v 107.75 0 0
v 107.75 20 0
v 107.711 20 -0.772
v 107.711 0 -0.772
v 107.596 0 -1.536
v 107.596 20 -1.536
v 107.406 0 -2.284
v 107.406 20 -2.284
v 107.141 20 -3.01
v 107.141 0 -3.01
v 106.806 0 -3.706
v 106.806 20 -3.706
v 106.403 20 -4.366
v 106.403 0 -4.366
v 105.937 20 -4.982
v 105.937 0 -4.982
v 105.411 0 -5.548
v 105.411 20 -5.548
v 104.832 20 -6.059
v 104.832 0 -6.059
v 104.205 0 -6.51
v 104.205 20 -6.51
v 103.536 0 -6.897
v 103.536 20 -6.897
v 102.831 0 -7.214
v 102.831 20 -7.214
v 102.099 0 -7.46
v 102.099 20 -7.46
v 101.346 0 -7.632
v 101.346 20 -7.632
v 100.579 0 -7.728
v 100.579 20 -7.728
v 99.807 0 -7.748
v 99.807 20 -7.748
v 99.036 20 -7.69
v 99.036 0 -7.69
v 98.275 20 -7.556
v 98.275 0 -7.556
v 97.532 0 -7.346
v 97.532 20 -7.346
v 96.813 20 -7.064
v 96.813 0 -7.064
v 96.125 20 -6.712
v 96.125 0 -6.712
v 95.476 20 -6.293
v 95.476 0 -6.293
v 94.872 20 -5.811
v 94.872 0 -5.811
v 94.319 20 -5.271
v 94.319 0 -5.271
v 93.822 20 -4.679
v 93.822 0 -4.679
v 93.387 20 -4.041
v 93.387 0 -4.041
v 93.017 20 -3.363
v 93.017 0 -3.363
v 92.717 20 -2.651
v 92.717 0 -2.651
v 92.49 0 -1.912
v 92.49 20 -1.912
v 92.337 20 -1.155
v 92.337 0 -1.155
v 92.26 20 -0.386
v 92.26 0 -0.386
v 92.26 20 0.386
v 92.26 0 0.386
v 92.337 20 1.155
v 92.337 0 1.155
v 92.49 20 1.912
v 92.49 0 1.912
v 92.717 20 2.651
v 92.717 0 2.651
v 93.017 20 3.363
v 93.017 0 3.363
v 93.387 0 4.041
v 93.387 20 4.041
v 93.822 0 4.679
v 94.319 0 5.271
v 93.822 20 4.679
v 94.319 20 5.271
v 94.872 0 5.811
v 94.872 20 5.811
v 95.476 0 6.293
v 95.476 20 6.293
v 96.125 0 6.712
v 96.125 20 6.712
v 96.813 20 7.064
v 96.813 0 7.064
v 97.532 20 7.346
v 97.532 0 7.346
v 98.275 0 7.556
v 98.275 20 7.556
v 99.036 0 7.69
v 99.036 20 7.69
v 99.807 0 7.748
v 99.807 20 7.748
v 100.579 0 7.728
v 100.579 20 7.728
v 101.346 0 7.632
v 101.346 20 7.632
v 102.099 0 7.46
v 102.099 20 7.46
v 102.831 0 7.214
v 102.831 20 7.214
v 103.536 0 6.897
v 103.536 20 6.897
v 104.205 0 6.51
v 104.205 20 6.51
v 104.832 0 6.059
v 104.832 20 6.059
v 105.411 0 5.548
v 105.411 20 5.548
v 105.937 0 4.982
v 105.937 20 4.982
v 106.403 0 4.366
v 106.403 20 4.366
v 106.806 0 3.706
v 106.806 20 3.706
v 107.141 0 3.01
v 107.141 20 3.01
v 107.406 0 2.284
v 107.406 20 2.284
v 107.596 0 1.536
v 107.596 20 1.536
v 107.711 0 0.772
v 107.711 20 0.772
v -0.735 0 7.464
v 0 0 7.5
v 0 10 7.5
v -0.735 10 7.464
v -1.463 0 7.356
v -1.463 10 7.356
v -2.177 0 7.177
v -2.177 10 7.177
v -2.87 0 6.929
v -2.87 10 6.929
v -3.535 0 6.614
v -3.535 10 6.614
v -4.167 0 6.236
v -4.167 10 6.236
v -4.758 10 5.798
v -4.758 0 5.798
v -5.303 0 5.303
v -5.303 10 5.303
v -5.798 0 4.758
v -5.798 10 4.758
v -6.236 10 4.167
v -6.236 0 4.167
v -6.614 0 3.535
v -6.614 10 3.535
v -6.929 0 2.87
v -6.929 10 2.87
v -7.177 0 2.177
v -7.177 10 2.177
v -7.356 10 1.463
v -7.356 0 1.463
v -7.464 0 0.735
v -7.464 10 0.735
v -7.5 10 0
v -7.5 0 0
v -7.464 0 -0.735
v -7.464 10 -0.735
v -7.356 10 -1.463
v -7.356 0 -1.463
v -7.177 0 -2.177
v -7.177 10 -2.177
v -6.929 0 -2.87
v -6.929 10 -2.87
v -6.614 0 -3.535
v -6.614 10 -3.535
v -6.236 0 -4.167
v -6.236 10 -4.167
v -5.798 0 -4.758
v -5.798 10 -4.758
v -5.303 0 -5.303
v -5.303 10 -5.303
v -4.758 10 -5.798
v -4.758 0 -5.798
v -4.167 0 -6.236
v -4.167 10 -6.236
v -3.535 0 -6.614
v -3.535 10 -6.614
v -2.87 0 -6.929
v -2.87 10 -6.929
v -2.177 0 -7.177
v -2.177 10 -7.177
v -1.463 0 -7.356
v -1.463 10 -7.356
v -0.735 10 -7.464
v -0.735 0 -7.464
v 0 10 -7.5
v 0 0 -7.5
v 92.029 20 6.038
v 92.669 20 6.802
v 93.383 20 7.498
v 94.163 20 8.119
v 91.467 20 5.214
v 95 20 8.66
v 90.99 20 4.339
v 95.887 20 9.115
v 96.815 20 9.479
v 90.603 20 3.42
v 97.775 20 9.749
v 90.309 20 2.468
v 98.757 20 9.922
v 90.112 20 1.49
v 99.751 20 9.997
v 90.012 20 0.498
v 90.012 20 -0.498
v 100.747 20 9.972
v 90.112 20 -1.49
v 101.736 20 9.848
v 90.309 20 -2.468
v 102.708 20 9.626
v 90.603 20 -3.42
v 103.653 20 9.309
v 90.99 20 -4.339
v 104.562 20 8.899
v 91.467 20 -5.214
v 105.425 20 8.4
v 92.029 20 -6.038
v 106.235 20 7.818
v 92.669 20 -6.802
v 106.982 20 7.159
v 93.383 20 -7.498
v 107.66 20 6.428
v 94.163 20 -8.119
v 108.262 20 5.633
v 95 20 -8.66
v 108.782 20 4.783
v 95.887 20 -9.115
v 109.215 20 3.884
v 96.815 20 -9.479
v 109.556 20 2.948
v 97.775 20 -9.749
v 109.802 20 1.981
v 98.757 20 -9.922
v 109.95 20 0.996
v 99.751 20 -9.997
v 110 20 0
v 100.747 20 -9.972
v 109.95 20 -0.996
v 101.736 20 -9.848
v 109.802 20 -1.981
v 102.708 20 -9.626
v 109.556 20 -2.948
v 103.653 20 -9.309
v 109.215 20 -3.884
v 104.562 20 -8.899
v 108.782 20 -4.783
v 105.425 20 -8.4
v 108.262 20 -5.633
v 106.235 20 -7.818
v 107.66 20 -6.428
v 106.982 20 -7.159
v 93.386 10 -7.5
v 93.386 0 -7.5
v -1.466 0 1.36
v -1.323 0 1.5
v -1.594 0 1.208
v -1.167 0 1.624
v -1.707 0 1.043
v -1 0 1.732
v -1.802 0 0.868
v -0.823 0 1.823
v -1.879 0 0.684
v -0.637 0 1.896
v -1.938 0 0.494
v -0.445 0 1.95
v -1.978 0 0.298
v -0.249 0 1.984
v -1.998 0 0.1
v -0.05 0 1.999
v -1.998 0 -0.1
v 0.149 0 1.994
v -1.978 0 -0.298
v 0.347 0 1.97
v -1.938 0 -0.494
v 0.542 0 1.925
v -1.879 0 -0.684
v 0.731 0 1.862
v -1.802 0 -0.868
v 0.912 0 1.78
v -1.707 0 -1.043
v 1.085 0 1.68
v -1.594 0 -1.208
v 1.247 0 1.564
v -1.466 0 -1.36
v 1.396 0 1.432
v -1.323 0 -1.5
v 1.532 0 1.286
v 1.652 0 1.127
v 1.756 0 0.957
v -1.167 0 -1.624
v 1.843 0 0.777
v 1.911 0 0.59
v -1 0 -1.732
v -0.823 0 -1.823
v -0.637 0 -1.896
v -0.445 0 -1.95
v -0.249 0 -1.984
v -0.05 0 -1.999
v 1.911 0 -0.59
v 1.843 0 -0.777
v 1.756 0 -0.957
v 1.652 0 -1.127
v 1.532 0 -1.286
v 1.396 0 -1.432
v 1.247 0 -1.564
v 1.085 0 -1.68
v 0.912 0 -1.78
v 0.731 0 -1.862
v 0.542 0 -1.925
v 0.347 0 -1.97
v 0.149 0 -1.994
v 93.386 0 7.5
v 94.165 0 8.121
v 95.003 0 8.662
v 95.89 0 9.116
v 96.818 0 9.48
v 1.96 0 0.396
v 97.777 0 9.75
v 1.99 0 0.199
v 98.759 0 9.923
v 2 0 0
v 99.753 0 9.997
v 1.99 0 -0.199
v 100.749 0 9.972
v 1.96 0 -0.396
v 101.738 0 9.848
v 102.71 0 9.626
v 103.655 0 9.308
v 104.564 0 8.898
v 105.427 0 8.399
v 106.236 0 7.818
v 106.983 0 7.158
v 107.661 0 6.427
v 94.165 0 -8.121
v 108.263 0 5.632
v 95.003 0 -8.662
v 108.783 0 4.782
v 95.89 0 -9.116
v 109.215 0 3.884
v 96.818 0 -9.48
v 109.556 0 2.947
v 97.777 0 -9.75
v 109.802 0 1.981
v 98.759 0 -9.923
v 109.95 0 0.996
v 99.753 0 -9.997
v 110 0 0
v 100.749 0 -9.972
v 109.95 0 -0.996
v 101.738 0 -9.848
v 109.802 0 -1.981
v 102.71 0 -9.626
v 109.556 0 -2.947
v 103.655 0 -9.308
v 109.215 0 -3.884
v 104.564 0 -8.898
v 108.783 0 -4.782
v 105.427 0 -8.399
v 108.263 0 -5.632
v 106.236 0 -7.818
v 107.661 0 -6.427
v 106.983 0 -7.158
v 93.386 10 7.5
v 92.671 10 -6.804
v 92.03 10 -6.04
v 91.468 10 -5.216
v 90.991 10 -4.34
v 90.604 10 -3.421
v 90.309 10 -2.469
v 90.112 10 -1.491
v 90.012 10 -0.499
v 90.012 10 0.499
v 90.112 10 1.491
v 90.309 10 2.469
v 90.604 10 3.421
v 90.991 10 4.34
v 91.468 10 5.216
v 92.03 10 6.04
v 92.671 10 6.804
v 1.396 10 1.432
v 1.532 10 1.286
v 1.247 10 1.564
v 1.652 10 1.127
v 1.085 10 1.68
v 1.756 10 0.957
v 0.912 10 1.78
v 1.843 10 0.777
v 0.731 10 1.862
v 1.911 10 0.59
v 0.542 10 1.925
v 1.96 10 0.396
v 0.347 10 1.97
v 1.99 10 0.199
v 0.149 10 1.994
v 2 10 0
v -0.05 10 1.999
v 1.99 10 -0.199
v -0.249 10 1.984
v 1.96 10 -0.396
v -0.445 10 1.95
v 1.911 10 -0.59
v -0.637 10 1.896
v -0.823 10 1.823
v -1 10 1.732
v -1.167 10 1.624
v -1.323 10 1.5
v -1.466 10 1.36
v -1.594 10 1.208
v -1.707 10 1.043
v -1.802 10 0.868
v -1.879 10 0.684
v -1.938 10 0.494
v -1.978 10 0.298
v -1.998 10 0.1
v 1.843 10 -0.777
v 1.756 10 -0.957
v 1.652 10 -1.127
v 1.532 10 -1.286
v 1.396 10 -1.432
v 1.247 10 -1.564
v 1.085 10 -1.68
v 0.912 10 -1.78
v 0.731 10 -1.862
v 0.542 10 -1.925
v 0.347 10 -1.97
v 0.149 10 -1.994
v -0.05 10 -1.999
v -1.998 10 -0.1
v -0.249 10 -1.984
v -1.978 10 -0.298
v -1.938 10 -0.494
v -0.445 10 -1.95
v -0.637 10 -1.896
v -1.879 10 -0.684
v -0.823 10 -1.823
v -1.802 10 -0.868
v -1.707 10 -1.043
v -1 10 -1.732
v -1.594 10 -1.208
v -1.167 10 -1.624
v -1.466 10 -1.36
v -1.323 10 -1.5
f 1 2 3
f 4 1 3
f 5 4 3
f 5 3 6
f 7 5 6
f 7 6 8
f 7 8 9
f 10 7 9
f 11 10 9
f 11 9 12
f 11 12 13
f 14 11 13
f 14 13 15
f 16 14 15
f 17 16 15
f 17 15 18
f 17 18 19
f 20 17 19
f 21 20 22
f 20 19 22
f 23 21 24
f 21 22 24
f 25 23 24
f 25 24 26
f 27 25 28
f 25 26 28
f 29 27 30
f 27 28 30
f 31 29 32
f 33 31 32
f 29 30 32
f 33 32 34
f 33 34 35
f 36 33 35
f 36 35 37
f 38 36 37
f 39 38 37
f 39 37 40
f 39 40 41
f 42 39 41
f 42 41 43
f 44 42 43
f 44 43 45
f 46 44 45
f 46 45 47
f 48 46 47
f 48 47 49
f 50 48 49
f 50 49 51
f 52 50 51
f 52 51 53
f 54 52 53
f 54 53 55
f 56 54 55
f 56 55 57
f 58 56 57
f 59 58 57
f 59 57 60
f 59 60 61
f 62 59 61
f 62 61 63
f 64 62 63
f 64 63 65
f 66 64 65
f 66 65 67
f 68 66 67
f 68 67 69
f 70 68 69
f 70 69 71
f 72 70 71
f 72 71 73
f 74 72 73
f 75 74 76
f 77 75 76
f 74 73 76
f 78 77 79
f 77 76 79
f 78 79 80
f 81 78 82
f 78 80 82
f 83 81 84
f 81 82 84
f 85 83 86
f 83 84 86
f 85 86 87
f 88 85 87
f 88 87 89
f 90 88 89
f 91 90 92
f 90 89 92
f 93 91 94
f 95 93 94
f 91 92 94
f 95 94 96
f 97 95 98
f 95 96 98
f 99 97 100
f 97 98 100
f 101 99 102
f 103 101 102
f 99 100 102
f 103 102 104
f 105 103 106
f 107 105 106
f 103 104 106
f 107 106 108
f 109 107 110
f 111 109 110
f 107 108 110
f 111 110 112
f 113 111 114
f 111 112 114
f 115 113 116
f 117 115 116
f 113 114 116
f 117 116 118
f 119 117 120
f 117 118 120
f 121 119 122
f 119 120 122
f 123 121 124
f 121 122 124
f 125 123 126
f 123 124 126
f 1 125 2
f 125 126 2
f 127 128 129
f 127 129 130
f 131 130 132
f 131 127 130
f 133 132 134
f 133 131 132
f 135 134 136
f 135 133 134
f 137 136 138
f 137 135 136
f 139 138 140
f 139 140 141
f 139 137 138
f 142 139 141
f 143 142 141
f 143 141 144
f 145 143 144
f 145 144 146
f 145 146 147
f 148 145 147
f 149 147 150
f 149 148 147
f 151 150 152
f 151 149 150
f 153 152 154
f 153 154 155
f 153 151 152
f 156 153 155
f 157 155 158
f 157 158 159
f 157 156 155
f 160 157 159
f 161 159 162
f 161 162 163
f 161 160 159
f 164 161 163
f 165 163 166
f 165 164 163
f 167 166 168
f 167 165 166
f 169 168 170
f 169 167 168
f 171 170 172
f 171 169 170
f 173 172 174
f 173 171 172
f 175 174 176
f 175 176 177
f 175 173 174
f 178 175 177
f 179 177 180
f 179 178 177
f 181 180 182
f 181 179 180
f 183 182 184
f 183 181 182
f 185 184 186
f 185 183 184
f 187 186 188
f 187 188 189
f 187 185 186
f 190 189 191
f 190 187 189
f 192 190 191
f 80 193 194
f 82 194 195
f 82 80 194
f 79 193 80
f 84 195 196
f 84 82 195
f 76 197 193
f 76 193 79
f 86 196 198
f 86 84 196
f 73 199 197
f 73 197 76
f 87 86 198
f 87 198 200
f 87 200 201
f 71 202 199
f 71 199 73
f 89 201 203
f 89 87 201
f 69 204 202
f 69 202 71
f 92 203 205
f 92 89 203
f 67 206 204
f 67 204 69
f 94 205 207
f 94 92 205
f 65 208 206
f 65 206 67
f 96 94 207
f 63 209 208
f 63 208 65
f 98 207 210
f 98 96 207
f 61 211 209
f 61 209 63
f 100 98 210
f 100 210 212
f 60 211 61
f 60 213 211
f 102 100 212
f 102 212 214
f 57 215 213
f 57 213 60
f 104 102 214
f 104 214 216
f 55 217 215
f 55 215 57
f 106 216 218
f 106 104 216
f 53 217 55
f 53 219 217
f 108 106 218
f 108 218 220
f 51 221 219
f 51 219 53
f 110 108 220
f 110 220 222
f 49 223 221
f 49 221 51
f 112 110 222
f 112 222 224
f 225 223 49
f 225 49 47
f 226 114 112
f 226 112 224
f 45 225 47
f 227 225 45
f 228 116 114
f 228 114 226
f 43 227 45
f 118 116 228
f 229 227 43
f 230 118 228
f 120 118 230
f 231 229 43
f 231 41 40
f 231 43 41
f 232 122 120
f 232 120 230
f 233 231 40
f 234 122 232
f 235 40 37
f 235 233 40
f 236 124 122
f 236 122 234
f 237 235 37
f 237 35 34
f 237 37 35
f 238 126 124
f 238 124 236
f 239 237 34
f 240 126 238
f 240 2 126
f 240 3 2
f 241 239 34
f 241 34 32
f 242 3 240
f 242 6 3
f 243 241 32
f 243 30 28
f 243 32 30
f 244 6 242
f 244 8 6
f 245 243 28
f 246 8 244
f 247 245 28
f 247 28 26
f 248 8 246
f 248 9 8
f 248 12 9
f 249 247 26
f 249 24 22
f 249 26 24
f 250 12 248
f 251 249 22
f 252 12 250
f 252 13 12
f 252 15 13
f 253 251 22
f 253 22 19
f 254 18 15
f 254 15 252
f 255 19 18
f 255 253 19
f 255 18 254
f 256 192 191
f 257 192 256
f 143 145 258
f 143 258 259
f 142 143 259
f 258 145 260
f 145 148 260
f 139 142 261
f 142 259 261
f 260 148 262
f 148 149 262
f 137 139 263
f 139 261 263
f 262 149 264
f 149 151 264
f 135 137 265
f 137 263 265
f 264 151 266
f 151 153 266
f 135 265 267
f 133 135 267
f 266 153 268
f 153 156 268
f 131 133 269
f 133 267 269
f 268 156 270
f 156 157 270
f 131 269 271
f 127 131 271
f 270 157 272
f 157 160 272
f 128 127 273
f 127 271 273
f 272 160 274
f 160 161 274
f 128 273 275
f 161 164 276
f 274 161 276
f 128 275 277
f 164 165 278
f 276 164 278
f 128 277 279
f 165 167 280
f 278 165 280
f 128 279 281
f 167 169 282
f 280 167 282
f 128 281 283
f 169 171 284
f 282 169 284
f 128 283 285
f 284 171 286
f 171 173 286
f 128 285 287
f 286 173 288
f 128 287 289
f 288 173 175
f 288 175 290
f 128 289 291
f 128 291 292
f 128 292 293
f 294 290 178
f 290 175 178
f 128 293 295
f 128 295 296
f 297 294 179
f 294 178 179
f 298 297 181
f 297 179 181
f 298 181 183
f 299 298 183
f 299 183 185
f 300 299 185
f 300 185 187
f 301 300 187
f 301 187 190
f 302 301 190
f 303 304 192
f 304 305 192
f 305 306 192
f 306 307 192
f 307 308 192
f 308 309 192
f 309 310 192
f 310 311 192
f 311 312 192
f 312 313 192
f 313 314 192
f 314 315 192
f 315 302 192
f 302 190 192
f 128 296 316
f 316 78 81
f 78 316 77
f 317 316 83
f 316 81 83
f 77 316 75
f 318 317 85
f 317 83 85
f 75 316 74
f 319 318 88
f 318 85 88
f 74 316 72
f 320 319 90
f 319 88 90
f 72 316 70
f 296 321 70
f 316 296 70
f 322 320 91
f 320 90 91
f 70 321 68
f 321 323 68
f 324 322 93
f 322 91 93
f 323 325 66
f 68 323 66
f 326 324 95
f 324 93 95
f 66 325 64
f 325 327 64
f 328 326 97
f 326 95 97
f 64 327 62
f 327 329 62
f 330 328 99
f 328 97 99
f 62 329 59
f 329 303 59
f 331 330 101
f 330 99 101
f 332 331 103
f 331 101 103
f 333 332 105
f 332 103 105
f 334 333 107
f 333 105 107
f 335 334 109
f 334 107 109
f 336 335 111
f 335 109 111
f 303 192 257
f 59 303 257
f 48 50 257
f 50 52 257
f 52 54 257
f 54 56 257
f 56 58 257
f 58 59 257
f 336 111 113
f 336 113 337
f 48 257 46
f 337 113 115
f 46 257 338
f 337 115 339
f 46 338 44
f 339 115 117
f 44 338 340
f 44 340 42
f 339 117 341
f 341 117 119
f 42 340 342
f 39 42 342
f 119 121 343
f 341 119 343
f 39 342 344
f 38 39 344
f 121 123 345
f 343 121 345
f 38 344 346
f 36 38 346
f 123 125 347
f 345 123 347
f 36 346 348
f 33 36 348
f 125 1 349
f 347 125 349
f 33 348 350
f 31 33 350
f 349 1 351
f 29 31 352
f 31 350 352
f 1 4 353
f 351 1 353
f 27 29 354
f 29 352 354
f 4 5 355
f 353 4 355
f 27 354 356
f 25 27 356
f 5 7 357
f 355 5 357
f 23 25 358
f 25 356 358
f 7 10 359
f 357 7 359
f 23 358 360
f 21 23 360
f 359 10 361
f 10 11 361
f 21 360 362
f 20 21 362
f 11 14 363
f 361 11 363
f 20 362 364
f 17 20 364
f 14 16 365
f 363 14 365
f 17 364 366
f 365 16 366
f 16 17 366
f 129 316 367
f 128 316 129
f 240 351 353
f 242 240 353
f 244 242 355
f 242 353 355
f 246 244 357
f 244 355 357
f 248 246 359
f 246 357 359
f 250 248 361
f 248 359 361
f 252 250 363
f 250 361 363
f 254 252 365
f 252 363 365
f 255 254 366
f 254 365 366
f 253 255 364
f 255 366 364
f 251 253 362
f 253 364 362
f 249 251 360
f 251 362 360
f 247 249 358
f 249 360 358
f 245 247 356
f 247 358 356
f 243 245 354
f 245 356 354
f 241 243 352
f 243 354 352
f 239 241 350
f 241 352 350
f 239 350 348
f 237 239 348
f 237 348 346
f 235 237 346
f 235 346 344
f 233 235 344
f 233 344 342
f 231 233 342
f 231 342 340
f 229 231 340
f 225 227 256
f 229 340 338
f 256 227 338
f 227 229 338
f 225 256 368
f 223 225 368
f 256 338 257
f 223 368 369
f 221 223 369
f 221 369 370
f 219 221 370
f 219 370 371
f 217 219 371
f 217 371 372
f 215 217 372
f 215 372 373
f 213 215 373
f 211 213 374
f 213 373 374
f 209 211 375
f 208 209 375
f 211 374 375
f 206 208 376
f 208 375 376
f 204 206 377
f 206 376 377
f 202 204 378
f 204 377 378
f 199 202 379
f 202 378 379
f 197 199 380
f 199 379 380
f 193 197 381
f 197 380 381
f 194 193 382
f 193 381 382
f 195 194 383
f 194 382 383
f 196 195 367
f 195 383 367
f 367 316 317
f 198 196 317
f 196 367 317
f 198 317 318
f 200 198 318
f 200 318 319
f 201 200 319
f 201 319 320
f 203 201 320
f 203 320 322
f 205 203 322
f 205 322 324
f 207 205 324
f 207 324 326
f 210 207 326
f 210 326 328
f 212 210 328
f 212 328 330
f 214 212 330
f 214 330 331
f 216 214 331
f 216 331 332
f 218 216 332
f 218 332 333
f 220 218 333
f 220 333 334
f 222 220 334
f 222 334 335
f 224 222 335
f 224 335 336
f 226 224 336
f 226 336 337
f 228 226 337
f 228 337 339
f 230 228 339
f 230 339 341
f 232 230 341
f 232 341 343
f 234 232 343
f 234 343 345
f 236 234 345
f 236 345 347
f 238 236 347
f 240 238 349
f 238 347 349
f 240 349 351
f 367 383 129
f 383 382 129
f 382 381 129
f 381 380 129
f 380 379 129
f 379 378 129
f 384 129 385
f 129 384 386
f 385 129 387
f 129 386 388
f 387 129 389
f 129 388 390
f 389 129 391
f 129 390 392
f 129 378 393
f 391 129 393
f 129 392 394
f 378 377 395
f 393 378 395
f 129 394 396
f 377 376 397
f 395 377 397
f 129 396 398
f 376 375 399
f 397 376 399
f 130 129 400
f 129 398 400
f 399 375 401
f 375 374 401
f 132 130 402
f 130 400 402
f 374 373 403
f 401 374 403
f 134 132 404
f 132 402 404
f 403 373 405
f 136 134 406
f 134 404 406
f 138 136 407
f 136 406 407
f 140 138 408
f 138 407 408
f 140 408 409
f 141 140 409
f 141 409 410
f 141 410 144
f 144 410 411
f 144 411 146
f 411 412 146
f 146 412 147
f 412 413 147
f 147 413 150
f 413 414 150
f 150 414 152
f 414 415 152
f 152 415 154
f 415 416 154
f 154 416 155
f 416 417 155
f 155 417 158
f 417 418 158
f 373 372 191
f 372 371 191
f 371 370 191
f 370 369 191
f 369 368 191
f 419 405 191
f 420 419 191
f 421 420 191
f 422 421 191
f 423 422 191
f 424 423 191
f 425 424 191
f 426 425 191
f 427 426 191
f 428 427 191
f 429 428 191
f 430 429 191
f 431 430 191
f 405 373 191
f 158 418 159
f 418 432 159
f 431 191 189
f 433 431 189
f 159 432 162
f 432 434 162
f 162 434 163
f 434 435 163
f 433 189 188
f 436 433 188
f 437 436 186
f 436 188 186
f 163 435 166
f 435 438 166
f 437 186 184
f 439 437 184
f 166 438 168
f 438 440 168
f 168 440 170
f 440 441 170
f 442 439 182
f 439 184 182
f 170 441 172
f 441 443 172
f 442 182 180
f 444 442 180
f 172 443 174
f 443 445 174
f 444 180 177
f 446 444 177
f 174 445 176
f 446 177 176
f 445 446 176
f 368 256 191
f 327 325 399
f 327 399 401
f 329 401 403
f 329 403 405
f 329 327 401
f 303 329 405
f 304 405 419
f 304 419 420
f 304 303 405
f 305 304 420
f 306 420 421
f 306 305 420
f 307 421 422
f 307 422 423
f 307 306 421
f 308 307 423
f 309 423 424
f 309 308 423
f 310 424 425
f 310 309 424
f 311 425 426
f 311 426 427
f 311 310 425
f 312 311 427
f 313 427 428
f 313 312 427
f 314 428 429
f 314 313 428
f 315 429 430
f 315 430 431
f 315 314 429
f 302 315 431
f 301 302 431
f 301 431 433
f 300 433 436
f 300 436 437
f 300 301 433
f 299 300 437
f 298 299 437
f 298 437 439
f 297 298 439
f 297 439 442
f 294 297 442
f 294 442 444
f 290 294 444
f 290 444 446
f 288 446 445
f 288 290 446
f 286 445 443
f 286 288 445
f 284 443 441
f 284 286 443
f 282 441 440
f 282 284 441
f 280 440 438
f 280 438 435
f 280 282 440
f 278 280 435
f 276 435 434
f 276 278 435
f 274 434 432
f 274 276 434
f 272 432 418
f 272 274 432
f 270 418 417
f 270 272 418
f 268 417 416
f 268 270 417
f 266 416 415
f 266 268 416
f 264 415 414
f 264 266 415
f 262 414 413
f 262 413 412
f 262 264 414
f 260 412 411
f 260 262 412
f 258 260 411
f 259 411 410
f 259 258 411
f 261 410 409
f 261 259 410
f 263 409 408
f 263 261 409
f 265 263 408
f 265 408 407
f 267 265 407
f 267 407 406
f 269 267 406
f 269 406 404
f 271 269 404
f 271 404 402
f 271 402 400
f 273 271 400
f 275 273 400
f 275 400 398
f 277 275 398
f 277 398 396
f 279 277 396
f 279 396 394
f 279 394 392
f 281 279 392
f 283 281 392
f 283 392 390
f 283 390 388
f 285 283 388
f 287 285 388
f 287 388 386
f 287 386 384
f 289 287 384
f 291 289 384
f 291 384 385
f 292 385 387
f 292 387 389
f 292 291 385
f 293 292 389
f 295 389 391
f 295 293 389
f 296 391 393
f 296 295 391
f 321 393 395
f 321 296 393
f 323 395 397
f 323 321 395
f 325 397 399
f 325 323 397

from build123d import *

# Parameters (mm, degrees)
SKETCH2_R           = 2
SKETCH2_R_2         = 2.5
BOSS_EXTRUDE1_DEPTH = 10
SKETCH3_R           = 10
BOSS_EXTRUDE3_DEPTH = 20
CUT_EXTRUDE1_REACH  = 22
SKETCH4_R           = 7.75


with BuildPart() as part:
    # Sketch2 → Boss-Extrude1 (new body)
    with BuildSketch(Plane(origin=(0, 0, 0), x_dir=(1, 0, 0), z_dir=(0, 1, 0))):
        with BuildLine():
            Line((0, 7.5), (100, 7.5))
            ThreePointArc((100, 7.5), (107.5, 0), (100, -7.5))
            Line((100, -7.5), (0, -7.5))
            ThreePointArc((0, -7.5), (-7.5, 0), (0, 7.5))
        make_face()
        Circle(SKETCH2_R, mode=Mode.SUBTRACT)
        with Locations((100, 0)):
            Circle(SKETCH2_R_2, mode=Mode.SUBTRACT)
    extrude(amount=BOSS_EXTRUDE1_DEPTH)

    # Sketch3 → Boss-Extrude3 (add)
    with BuildSketch(Plane(origin=(0, 0, 0), x_dir=(1, 0, 0), z_dir=(0, 1, 0))):
        with Locations((100, 0)):
            Circle(SKETCH3_R)
    extrude(amount=BOSS_EXTRUDE3_DEPTH)

    # Sketch4 → Cut-Extrude1 (cut, up to next)
    with BuildSketch(Plane(origin=(0, 20, 0), x_dir=(1, 0, 0), z_dir=(0, 1, 0)), mode=Mode.PRIVATE) as cut_extrude1_sk1:
        with Locations((100, 0)):
            Circle(SKETCH4_R)
    cut_extrude1_tool1 = extrude(cut_extrude1_sk1.sketch, amount=-CUT_EXTRUDE1_REACH, mode=Mode.PRIVATE) & part.part
    add(cut_extrude1_tool1.solids().sort_by_distance((100, 20, 0))[0], mode=Mode.SUBTRACT)


solid = part.part
